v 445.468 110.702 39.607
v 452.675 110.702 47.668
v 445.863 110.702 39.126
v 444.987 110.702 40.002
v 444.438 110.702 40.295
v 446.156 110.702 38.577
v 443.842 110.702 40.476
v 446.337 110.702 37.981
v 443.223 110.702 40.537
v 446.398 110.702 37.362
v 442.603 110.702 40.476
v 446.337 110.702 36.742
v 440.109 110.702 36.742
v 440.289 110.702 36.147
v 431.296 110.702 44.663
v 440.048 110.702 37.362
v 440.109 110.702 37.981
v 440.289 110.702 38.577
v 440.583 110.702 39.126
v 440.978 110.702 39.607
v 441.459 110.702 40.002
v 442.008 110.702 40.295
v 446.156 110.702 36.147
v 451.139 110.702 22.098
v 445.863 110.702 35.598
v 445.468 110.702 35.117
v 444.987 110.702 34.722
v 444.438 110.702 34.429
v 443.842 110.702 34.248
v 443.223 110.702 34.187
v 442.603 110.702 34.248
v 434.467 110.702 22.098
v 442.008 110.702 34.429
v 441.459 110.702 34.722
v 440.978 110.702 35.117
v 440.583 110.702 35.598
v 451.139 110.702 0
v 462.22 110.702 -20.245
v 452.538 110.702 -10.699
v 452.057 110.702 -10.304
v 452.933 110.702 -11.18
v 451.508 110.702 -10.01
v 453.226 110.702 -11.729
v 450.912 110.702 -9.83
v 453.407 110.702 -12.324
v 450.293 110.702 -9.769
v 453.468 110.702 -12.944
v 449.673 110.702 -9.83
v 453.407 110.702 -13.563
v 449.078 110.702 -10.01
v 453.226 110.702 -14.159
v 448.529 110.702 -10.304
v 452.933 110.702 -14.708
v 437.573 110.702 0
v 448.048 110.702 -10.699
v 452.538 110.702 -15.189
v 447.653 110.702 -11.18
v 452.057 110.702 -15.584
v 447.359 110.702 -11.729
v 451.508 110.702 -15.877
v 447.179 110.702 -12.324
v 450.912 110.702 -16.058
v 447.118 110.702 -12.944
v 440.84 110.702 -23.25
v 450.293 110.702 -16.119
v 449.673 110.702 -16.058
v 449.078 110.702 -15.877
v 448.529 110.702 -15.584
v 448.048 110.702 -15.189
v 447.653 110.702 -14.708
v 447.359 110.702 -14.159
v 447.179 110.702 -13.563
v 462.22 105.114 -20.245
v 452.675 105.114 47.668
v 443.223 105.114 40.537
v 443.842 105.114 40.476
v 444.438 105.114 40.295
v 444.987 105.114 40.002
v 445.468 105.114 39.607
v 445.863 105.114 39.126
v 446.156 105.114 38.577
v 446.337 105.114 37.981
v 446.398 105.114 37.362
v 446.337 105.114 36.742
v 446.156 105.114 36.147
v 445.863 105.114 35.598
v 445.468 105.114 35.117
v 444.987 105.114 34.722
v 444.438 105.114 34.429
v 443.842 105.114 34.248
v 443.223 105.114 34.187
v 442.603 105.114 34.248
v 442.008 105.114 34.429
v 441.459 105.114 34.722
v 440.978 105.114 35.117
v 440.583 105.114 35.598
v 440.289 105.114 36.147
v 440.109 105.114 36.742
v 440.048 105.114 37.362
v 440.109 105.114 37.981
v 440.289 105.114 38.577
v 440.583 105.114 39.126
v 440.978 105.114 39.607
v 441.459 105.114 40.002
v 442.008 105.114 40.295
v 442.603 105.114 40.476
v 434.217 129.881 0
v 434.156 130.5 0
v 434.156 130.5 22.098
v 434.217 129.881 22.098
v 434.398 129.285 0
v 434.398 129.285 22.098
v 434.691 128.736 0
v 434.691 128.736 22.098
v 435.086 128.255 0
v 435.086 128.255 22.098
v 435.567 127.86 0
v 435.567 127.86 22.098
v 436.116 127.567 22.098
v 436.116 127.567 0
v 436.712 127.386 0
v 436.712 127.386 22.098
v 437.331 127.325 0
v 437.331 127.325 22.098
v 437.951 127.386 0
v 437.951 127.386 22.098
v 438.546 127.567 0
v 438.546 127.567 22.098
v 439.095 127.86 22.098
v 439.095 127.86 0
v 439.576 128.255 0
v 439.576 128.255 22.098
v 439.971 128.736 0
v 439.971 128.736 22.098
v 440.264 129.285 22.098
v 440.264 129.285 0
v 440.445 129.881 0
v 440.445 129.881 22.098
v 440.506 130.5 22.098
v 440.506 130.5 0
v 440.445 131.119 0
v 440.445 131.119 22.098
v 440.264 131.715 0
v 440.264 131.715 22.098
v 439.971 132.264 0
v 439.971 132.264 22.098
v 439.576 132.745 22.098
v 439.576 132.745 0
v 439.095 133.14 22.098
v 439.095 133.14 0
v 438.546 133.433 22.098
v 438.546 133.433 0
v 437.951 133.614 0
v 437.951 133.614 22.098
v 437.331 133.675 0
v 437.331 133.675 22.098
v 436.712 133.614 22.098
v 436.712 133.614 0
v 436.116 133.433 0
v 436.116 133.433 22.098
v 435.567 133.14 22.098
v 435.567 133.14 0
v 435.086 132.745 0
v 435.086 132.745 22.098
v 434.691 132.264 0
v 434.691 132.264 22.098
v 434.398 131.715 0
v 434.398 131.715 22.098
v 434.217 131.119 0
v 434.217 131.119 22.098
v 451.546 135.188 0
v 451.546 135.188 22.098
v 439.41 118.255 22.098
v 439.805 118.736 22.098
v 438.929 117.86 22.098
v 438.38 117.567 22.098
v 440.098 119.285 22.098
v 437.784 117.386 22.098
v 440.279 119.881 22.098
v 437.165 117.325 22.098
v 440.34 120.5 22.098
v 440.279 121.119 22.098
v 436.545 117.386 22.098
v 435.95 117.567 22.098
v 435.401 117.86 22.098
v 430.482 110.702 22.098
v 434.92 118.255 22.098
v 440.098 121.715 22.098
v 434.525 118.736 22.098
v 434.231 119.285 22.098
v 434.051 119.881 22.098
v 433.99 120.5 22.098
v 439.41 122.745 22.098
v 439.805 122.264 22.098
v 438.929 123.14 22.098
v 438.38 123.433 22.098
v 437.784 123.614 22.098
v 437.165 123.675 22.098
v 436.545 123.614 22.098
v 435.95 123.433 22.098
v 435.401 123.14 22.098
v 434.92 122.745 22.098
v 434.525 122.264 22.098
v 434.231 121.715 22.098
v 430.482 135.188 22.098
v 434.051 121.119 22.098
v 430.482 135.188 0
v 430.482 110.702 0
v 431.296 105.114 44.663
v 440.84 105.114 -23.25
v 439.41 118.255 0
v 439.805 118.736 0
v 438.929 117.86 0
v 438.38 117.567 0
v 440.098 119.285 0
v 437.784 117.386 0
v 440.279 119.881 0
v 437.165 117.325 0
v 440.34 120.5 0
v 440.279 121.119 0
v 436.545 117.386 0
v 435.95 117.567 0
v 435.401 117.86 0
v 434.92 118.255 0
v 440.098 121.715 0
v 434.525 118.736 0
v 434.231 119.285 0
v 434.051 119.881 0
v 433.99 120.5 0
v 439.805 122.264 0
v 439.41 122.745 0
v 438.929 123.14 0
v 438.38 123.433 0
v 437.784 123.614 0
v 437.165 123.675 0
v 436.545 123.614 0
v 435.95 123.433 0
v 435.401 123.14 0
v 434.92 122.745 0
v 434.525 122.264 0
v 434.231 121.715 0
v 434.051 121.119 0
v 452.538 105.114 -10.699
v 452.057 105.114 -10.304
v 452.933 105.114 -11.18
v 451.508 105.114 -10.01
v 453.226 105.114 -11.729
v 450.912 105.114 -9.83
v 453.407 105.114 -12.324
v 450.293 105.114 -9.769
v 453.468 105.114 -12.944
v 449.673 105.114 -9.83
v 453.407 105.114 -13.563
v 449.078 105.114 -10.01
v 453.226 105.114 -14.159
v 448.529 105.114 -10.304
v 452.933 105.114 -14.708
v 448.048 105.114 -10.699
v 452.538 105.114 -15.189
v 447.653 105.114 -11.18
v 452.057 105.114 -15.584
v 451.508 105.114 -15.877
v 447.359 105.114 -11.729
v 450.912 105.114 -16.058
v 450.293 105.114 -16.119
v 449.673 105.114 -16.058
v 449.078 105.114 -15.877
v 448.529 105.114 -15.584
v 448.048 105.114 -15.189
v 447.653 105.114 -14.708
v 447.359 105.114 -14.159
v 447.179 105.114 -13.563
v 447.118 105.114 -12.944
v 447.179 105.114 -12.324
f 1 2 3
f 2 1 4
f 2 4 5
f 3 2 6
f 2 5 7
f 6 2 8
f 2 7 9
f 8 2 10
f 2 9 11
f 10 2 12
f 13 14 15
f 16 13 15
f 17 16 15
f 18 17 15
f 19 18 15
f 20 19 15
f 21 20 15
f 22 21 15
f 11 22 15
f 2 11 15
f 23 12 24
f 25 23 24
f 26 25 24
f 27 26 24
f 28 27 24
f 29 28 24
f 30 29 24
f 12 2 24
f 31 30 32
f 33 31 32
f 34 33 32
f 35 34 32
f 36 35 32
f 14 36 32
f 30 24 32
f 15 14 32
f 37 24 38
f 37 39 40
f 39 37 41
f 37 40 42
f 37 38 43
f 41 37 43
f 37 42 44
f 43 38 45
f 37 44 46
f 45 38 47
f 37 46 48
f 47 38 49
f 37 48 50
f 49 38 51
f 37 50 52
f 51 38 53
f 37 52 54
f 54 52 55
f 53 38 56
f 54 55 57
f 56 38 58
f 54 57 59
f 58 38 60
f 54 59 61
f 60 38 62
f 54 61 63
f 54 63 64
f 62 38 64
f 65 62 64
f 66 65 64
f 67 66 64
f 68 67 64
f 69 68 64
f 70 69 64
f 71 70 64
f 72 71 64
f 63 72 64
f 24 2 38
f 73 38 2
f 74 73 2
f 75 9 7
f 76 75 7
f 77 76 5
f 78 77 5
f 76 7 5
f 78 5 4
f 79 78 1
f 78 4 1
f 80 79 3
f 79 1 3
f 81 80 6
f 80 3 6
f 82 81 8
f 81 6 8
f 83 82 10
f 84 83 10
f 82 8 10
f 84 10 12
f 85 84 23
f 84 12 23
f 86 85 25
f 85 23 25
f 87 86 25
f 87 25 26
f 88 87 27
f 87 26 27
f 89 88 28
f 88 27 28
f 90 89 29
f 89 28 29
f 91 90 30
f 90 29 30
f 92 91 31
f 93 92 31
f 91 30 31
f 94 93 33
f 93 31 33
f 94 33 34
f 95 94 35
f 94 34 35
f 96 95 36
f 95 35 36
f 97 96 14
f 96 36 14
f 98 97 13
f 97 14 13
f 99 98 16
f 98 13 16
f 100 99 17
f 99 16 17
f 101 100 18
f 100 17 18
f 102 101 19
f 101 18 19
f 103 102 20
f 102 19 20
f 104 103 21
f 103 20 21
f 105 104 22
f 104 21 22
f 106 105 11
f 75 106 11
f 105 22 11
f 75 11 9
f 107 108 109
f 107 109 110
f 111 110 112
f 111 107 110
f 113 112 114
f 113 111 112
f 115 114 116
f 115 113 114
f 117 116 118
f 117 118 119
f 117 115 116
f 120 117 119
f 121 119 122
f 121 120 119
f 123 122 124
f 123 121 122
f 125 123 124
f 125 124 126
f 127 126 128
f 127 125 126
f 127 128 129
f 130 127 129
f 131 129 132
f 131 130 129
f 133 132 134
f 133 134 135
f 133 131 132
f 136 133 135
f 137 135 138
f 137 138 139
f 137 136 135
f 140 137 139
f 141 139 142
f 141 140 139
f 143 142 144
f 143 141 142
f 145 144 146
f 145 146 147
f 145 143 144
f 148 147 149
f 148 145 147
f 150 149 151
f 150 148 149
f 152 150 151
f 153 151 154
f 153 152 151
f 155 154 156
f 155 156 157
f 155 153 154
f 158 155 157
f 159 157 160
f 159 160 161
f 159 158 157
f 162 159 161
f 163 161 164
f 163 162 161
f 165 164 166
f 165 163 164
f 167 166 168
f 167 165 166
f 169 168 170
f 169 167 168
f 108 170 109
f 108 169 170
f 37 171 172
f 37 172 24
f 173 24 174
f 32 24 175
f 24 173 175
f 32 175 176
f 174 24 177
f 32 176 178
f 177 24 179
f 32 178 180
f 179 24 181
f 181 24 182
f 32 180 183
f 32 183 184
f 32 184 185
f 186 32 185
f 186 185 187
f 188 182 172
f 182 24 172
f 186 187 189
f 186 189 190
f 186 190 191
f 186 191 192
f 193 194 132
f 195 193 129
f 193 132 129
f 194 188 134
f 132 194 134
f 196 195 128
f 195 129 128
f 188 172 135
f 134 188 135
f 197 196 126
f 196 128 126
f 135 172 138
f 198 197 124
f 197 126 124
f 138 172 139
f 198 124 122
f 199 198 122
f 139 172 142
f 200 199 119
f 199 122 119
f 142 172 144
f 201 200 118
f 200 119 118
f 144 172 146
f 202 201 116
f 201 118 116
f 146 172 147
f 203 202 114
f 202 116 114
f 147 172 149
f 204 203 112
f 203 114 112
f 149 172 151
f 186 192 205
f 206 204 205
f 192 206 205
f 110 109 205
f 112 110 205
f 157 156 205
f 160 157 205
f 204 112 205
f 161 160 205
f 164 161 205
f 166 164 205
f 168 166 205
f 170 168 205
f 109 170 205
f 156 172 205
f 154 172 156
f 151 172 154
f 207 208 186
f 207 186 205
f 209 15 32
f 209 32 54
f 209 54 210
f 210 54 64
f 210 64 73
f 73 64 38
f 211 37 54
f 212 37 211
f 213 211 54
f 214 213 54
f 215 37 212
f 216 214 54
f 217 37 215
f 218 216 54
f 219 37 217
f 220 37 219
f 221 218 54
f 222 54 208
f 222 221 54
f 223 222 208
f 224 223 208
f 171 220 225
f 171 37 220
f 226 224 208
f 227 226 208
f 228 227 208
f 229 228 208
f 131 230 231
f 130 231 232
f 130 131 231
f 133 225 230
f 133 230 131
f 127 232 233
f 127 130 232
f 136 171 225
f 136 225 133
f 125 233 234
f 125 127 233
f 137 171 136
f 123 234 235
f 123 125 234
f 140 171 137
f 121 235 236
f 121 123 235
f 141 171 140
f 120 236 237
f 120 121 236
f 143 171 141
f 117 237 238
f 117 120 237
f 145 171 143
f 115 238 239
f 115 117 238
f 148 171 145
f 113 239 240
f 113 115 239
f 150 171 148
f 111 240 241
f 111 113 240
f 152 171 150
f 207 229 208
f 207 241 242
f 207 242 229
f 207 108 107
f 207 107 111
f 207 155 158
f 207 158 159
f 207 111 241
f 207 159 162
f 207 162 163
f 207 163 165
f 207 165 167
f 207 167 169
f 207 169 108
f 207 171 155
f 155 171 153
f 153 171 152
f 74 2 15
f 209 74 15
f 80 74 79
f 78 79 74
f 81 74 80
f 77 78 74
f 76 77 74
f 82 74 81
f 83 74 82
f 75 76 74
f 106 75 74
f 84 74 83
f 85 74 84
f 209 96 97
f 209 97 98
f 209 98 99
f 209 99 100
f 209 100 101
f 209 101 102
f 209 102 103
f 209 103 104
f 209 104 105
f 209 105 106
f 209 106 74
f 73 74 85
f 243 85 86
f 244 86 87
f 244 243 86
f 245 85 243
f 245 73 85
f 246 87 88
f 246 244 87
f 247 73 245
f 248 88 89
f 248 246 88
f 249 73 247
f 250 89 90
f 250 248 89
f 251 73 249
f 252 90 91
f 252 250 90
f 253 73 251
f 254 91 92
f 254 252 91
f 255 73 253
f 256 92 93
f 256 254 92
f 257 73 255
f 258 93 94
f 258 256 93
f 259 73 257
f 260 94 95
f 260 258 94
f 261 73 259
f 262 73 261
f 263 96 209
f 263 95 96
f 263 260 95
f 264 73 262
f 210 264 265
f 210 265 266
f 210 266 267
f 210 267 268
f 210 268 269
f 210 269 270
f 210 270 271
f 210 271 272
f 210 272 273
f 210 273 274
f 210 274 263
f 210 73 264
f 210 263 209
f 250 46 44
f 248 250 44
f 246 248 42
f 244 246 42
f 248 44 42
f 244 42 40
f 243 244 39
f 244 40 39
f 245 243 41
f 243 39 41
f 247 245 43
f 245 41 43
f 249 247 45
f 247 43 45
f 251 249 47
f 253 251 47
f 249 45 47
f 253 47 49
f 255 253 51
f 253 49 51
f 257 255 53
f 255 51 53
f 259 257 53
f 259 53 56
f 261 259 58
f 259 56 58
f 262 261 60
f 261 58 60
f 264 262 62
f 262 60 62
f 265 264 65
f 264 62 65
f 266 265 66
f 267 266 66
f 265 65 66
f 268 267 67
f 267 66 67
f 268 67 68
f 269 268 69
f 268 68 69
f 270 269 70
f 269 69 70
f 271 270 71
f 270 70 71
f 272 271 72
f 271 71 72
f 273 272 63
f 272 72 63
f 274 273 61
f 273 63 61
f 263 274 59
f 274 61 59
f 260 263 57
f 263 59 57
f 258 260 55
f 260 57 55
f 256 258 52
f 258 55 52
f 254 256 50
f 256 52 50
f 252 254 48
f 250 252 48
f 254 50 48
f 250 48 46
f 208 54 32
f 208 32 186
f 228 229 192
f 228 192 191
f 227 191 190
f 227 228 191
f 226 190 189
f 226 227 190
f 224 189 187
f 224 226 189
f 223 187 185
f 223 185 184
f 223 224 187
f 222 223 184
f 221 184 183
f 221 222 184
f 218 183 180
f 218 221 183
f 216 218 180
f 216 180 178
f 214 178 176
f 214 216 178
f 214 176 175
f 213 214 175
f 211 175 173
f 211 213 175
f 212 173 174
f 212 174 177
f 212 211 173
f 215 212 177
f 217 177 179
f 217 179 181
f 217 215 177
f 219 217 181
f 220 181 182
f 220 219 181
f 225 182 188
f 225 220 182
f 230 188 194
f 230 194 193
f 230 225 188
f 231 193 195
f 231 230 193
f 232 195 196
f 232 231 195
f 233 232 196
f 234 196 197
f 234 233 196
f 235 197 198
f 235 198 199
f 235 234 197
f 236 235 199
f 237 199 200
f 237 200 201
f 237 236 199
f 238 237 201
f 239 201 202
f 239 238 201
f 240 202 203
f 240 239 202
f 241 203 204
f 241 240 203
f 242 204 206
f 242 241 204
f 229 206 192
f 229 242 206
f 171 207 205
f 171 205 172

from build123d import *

# Parameters (mm, degrees)
SKETCH1_R           = 3.175
BOSS_EXTRUDE1_DEPTH = 22.098
SKETCH2_R           = 3.175
BOSS_EXTRUDE2_DEPTH = 5.588


with BuildPart() as part:
    # Sketch1 → Boss-Extrude1 (new body)
    with BuildSketch(Plane.XY):
        Polygon((430.481837091, 135.188251435), (451.546293611, 135.188251435), (451.139125986, 110.702070678), (430.481837091, 110.702070678), align=None)
        with Locations(Location((437.331098026, 130.5, 0), (0, 0, 180))):
            Circle(SKETCH1_R, mode=Mode.SUBTRACT)
        with Locations(Location((437.164813366, 120.5, 0), (0, 0, 180))):
            Circle(SKETCH1_R, mode=Mode.SUBTRACT)
    extrude(amount=BOSS_EXTRUDE1_DEPTH)

    # Sketch2 → Boss-Extrude2 (add)
    with BuildSketch(Plane(origin=(0, 110.702070678, 0), x_dir=(1, 0, 0), z_dir=(0, 1, 0))):
        Polygon((431.295573302, -44.662968175), (440.840064565, 23.249615979), (462.21995217, 20.24486873), (452.675460906, -47.667715425), align=None)
        with Locations(Location((443.222765971, -37.361858669, 0), (0, 0, 270))):
            Circle(SKETCH2_R, mode=Mode.SUBTRACT)
        with Locations(Location((450.2927595, 12.943759223, 0), (0, 0, 270))):
            Circle(SKETCH2_R, mode=Mode.SUBTRACT)
    extrude(amount=-BOSS_EXTRUDE2_DEPTH)


solid = part.part
